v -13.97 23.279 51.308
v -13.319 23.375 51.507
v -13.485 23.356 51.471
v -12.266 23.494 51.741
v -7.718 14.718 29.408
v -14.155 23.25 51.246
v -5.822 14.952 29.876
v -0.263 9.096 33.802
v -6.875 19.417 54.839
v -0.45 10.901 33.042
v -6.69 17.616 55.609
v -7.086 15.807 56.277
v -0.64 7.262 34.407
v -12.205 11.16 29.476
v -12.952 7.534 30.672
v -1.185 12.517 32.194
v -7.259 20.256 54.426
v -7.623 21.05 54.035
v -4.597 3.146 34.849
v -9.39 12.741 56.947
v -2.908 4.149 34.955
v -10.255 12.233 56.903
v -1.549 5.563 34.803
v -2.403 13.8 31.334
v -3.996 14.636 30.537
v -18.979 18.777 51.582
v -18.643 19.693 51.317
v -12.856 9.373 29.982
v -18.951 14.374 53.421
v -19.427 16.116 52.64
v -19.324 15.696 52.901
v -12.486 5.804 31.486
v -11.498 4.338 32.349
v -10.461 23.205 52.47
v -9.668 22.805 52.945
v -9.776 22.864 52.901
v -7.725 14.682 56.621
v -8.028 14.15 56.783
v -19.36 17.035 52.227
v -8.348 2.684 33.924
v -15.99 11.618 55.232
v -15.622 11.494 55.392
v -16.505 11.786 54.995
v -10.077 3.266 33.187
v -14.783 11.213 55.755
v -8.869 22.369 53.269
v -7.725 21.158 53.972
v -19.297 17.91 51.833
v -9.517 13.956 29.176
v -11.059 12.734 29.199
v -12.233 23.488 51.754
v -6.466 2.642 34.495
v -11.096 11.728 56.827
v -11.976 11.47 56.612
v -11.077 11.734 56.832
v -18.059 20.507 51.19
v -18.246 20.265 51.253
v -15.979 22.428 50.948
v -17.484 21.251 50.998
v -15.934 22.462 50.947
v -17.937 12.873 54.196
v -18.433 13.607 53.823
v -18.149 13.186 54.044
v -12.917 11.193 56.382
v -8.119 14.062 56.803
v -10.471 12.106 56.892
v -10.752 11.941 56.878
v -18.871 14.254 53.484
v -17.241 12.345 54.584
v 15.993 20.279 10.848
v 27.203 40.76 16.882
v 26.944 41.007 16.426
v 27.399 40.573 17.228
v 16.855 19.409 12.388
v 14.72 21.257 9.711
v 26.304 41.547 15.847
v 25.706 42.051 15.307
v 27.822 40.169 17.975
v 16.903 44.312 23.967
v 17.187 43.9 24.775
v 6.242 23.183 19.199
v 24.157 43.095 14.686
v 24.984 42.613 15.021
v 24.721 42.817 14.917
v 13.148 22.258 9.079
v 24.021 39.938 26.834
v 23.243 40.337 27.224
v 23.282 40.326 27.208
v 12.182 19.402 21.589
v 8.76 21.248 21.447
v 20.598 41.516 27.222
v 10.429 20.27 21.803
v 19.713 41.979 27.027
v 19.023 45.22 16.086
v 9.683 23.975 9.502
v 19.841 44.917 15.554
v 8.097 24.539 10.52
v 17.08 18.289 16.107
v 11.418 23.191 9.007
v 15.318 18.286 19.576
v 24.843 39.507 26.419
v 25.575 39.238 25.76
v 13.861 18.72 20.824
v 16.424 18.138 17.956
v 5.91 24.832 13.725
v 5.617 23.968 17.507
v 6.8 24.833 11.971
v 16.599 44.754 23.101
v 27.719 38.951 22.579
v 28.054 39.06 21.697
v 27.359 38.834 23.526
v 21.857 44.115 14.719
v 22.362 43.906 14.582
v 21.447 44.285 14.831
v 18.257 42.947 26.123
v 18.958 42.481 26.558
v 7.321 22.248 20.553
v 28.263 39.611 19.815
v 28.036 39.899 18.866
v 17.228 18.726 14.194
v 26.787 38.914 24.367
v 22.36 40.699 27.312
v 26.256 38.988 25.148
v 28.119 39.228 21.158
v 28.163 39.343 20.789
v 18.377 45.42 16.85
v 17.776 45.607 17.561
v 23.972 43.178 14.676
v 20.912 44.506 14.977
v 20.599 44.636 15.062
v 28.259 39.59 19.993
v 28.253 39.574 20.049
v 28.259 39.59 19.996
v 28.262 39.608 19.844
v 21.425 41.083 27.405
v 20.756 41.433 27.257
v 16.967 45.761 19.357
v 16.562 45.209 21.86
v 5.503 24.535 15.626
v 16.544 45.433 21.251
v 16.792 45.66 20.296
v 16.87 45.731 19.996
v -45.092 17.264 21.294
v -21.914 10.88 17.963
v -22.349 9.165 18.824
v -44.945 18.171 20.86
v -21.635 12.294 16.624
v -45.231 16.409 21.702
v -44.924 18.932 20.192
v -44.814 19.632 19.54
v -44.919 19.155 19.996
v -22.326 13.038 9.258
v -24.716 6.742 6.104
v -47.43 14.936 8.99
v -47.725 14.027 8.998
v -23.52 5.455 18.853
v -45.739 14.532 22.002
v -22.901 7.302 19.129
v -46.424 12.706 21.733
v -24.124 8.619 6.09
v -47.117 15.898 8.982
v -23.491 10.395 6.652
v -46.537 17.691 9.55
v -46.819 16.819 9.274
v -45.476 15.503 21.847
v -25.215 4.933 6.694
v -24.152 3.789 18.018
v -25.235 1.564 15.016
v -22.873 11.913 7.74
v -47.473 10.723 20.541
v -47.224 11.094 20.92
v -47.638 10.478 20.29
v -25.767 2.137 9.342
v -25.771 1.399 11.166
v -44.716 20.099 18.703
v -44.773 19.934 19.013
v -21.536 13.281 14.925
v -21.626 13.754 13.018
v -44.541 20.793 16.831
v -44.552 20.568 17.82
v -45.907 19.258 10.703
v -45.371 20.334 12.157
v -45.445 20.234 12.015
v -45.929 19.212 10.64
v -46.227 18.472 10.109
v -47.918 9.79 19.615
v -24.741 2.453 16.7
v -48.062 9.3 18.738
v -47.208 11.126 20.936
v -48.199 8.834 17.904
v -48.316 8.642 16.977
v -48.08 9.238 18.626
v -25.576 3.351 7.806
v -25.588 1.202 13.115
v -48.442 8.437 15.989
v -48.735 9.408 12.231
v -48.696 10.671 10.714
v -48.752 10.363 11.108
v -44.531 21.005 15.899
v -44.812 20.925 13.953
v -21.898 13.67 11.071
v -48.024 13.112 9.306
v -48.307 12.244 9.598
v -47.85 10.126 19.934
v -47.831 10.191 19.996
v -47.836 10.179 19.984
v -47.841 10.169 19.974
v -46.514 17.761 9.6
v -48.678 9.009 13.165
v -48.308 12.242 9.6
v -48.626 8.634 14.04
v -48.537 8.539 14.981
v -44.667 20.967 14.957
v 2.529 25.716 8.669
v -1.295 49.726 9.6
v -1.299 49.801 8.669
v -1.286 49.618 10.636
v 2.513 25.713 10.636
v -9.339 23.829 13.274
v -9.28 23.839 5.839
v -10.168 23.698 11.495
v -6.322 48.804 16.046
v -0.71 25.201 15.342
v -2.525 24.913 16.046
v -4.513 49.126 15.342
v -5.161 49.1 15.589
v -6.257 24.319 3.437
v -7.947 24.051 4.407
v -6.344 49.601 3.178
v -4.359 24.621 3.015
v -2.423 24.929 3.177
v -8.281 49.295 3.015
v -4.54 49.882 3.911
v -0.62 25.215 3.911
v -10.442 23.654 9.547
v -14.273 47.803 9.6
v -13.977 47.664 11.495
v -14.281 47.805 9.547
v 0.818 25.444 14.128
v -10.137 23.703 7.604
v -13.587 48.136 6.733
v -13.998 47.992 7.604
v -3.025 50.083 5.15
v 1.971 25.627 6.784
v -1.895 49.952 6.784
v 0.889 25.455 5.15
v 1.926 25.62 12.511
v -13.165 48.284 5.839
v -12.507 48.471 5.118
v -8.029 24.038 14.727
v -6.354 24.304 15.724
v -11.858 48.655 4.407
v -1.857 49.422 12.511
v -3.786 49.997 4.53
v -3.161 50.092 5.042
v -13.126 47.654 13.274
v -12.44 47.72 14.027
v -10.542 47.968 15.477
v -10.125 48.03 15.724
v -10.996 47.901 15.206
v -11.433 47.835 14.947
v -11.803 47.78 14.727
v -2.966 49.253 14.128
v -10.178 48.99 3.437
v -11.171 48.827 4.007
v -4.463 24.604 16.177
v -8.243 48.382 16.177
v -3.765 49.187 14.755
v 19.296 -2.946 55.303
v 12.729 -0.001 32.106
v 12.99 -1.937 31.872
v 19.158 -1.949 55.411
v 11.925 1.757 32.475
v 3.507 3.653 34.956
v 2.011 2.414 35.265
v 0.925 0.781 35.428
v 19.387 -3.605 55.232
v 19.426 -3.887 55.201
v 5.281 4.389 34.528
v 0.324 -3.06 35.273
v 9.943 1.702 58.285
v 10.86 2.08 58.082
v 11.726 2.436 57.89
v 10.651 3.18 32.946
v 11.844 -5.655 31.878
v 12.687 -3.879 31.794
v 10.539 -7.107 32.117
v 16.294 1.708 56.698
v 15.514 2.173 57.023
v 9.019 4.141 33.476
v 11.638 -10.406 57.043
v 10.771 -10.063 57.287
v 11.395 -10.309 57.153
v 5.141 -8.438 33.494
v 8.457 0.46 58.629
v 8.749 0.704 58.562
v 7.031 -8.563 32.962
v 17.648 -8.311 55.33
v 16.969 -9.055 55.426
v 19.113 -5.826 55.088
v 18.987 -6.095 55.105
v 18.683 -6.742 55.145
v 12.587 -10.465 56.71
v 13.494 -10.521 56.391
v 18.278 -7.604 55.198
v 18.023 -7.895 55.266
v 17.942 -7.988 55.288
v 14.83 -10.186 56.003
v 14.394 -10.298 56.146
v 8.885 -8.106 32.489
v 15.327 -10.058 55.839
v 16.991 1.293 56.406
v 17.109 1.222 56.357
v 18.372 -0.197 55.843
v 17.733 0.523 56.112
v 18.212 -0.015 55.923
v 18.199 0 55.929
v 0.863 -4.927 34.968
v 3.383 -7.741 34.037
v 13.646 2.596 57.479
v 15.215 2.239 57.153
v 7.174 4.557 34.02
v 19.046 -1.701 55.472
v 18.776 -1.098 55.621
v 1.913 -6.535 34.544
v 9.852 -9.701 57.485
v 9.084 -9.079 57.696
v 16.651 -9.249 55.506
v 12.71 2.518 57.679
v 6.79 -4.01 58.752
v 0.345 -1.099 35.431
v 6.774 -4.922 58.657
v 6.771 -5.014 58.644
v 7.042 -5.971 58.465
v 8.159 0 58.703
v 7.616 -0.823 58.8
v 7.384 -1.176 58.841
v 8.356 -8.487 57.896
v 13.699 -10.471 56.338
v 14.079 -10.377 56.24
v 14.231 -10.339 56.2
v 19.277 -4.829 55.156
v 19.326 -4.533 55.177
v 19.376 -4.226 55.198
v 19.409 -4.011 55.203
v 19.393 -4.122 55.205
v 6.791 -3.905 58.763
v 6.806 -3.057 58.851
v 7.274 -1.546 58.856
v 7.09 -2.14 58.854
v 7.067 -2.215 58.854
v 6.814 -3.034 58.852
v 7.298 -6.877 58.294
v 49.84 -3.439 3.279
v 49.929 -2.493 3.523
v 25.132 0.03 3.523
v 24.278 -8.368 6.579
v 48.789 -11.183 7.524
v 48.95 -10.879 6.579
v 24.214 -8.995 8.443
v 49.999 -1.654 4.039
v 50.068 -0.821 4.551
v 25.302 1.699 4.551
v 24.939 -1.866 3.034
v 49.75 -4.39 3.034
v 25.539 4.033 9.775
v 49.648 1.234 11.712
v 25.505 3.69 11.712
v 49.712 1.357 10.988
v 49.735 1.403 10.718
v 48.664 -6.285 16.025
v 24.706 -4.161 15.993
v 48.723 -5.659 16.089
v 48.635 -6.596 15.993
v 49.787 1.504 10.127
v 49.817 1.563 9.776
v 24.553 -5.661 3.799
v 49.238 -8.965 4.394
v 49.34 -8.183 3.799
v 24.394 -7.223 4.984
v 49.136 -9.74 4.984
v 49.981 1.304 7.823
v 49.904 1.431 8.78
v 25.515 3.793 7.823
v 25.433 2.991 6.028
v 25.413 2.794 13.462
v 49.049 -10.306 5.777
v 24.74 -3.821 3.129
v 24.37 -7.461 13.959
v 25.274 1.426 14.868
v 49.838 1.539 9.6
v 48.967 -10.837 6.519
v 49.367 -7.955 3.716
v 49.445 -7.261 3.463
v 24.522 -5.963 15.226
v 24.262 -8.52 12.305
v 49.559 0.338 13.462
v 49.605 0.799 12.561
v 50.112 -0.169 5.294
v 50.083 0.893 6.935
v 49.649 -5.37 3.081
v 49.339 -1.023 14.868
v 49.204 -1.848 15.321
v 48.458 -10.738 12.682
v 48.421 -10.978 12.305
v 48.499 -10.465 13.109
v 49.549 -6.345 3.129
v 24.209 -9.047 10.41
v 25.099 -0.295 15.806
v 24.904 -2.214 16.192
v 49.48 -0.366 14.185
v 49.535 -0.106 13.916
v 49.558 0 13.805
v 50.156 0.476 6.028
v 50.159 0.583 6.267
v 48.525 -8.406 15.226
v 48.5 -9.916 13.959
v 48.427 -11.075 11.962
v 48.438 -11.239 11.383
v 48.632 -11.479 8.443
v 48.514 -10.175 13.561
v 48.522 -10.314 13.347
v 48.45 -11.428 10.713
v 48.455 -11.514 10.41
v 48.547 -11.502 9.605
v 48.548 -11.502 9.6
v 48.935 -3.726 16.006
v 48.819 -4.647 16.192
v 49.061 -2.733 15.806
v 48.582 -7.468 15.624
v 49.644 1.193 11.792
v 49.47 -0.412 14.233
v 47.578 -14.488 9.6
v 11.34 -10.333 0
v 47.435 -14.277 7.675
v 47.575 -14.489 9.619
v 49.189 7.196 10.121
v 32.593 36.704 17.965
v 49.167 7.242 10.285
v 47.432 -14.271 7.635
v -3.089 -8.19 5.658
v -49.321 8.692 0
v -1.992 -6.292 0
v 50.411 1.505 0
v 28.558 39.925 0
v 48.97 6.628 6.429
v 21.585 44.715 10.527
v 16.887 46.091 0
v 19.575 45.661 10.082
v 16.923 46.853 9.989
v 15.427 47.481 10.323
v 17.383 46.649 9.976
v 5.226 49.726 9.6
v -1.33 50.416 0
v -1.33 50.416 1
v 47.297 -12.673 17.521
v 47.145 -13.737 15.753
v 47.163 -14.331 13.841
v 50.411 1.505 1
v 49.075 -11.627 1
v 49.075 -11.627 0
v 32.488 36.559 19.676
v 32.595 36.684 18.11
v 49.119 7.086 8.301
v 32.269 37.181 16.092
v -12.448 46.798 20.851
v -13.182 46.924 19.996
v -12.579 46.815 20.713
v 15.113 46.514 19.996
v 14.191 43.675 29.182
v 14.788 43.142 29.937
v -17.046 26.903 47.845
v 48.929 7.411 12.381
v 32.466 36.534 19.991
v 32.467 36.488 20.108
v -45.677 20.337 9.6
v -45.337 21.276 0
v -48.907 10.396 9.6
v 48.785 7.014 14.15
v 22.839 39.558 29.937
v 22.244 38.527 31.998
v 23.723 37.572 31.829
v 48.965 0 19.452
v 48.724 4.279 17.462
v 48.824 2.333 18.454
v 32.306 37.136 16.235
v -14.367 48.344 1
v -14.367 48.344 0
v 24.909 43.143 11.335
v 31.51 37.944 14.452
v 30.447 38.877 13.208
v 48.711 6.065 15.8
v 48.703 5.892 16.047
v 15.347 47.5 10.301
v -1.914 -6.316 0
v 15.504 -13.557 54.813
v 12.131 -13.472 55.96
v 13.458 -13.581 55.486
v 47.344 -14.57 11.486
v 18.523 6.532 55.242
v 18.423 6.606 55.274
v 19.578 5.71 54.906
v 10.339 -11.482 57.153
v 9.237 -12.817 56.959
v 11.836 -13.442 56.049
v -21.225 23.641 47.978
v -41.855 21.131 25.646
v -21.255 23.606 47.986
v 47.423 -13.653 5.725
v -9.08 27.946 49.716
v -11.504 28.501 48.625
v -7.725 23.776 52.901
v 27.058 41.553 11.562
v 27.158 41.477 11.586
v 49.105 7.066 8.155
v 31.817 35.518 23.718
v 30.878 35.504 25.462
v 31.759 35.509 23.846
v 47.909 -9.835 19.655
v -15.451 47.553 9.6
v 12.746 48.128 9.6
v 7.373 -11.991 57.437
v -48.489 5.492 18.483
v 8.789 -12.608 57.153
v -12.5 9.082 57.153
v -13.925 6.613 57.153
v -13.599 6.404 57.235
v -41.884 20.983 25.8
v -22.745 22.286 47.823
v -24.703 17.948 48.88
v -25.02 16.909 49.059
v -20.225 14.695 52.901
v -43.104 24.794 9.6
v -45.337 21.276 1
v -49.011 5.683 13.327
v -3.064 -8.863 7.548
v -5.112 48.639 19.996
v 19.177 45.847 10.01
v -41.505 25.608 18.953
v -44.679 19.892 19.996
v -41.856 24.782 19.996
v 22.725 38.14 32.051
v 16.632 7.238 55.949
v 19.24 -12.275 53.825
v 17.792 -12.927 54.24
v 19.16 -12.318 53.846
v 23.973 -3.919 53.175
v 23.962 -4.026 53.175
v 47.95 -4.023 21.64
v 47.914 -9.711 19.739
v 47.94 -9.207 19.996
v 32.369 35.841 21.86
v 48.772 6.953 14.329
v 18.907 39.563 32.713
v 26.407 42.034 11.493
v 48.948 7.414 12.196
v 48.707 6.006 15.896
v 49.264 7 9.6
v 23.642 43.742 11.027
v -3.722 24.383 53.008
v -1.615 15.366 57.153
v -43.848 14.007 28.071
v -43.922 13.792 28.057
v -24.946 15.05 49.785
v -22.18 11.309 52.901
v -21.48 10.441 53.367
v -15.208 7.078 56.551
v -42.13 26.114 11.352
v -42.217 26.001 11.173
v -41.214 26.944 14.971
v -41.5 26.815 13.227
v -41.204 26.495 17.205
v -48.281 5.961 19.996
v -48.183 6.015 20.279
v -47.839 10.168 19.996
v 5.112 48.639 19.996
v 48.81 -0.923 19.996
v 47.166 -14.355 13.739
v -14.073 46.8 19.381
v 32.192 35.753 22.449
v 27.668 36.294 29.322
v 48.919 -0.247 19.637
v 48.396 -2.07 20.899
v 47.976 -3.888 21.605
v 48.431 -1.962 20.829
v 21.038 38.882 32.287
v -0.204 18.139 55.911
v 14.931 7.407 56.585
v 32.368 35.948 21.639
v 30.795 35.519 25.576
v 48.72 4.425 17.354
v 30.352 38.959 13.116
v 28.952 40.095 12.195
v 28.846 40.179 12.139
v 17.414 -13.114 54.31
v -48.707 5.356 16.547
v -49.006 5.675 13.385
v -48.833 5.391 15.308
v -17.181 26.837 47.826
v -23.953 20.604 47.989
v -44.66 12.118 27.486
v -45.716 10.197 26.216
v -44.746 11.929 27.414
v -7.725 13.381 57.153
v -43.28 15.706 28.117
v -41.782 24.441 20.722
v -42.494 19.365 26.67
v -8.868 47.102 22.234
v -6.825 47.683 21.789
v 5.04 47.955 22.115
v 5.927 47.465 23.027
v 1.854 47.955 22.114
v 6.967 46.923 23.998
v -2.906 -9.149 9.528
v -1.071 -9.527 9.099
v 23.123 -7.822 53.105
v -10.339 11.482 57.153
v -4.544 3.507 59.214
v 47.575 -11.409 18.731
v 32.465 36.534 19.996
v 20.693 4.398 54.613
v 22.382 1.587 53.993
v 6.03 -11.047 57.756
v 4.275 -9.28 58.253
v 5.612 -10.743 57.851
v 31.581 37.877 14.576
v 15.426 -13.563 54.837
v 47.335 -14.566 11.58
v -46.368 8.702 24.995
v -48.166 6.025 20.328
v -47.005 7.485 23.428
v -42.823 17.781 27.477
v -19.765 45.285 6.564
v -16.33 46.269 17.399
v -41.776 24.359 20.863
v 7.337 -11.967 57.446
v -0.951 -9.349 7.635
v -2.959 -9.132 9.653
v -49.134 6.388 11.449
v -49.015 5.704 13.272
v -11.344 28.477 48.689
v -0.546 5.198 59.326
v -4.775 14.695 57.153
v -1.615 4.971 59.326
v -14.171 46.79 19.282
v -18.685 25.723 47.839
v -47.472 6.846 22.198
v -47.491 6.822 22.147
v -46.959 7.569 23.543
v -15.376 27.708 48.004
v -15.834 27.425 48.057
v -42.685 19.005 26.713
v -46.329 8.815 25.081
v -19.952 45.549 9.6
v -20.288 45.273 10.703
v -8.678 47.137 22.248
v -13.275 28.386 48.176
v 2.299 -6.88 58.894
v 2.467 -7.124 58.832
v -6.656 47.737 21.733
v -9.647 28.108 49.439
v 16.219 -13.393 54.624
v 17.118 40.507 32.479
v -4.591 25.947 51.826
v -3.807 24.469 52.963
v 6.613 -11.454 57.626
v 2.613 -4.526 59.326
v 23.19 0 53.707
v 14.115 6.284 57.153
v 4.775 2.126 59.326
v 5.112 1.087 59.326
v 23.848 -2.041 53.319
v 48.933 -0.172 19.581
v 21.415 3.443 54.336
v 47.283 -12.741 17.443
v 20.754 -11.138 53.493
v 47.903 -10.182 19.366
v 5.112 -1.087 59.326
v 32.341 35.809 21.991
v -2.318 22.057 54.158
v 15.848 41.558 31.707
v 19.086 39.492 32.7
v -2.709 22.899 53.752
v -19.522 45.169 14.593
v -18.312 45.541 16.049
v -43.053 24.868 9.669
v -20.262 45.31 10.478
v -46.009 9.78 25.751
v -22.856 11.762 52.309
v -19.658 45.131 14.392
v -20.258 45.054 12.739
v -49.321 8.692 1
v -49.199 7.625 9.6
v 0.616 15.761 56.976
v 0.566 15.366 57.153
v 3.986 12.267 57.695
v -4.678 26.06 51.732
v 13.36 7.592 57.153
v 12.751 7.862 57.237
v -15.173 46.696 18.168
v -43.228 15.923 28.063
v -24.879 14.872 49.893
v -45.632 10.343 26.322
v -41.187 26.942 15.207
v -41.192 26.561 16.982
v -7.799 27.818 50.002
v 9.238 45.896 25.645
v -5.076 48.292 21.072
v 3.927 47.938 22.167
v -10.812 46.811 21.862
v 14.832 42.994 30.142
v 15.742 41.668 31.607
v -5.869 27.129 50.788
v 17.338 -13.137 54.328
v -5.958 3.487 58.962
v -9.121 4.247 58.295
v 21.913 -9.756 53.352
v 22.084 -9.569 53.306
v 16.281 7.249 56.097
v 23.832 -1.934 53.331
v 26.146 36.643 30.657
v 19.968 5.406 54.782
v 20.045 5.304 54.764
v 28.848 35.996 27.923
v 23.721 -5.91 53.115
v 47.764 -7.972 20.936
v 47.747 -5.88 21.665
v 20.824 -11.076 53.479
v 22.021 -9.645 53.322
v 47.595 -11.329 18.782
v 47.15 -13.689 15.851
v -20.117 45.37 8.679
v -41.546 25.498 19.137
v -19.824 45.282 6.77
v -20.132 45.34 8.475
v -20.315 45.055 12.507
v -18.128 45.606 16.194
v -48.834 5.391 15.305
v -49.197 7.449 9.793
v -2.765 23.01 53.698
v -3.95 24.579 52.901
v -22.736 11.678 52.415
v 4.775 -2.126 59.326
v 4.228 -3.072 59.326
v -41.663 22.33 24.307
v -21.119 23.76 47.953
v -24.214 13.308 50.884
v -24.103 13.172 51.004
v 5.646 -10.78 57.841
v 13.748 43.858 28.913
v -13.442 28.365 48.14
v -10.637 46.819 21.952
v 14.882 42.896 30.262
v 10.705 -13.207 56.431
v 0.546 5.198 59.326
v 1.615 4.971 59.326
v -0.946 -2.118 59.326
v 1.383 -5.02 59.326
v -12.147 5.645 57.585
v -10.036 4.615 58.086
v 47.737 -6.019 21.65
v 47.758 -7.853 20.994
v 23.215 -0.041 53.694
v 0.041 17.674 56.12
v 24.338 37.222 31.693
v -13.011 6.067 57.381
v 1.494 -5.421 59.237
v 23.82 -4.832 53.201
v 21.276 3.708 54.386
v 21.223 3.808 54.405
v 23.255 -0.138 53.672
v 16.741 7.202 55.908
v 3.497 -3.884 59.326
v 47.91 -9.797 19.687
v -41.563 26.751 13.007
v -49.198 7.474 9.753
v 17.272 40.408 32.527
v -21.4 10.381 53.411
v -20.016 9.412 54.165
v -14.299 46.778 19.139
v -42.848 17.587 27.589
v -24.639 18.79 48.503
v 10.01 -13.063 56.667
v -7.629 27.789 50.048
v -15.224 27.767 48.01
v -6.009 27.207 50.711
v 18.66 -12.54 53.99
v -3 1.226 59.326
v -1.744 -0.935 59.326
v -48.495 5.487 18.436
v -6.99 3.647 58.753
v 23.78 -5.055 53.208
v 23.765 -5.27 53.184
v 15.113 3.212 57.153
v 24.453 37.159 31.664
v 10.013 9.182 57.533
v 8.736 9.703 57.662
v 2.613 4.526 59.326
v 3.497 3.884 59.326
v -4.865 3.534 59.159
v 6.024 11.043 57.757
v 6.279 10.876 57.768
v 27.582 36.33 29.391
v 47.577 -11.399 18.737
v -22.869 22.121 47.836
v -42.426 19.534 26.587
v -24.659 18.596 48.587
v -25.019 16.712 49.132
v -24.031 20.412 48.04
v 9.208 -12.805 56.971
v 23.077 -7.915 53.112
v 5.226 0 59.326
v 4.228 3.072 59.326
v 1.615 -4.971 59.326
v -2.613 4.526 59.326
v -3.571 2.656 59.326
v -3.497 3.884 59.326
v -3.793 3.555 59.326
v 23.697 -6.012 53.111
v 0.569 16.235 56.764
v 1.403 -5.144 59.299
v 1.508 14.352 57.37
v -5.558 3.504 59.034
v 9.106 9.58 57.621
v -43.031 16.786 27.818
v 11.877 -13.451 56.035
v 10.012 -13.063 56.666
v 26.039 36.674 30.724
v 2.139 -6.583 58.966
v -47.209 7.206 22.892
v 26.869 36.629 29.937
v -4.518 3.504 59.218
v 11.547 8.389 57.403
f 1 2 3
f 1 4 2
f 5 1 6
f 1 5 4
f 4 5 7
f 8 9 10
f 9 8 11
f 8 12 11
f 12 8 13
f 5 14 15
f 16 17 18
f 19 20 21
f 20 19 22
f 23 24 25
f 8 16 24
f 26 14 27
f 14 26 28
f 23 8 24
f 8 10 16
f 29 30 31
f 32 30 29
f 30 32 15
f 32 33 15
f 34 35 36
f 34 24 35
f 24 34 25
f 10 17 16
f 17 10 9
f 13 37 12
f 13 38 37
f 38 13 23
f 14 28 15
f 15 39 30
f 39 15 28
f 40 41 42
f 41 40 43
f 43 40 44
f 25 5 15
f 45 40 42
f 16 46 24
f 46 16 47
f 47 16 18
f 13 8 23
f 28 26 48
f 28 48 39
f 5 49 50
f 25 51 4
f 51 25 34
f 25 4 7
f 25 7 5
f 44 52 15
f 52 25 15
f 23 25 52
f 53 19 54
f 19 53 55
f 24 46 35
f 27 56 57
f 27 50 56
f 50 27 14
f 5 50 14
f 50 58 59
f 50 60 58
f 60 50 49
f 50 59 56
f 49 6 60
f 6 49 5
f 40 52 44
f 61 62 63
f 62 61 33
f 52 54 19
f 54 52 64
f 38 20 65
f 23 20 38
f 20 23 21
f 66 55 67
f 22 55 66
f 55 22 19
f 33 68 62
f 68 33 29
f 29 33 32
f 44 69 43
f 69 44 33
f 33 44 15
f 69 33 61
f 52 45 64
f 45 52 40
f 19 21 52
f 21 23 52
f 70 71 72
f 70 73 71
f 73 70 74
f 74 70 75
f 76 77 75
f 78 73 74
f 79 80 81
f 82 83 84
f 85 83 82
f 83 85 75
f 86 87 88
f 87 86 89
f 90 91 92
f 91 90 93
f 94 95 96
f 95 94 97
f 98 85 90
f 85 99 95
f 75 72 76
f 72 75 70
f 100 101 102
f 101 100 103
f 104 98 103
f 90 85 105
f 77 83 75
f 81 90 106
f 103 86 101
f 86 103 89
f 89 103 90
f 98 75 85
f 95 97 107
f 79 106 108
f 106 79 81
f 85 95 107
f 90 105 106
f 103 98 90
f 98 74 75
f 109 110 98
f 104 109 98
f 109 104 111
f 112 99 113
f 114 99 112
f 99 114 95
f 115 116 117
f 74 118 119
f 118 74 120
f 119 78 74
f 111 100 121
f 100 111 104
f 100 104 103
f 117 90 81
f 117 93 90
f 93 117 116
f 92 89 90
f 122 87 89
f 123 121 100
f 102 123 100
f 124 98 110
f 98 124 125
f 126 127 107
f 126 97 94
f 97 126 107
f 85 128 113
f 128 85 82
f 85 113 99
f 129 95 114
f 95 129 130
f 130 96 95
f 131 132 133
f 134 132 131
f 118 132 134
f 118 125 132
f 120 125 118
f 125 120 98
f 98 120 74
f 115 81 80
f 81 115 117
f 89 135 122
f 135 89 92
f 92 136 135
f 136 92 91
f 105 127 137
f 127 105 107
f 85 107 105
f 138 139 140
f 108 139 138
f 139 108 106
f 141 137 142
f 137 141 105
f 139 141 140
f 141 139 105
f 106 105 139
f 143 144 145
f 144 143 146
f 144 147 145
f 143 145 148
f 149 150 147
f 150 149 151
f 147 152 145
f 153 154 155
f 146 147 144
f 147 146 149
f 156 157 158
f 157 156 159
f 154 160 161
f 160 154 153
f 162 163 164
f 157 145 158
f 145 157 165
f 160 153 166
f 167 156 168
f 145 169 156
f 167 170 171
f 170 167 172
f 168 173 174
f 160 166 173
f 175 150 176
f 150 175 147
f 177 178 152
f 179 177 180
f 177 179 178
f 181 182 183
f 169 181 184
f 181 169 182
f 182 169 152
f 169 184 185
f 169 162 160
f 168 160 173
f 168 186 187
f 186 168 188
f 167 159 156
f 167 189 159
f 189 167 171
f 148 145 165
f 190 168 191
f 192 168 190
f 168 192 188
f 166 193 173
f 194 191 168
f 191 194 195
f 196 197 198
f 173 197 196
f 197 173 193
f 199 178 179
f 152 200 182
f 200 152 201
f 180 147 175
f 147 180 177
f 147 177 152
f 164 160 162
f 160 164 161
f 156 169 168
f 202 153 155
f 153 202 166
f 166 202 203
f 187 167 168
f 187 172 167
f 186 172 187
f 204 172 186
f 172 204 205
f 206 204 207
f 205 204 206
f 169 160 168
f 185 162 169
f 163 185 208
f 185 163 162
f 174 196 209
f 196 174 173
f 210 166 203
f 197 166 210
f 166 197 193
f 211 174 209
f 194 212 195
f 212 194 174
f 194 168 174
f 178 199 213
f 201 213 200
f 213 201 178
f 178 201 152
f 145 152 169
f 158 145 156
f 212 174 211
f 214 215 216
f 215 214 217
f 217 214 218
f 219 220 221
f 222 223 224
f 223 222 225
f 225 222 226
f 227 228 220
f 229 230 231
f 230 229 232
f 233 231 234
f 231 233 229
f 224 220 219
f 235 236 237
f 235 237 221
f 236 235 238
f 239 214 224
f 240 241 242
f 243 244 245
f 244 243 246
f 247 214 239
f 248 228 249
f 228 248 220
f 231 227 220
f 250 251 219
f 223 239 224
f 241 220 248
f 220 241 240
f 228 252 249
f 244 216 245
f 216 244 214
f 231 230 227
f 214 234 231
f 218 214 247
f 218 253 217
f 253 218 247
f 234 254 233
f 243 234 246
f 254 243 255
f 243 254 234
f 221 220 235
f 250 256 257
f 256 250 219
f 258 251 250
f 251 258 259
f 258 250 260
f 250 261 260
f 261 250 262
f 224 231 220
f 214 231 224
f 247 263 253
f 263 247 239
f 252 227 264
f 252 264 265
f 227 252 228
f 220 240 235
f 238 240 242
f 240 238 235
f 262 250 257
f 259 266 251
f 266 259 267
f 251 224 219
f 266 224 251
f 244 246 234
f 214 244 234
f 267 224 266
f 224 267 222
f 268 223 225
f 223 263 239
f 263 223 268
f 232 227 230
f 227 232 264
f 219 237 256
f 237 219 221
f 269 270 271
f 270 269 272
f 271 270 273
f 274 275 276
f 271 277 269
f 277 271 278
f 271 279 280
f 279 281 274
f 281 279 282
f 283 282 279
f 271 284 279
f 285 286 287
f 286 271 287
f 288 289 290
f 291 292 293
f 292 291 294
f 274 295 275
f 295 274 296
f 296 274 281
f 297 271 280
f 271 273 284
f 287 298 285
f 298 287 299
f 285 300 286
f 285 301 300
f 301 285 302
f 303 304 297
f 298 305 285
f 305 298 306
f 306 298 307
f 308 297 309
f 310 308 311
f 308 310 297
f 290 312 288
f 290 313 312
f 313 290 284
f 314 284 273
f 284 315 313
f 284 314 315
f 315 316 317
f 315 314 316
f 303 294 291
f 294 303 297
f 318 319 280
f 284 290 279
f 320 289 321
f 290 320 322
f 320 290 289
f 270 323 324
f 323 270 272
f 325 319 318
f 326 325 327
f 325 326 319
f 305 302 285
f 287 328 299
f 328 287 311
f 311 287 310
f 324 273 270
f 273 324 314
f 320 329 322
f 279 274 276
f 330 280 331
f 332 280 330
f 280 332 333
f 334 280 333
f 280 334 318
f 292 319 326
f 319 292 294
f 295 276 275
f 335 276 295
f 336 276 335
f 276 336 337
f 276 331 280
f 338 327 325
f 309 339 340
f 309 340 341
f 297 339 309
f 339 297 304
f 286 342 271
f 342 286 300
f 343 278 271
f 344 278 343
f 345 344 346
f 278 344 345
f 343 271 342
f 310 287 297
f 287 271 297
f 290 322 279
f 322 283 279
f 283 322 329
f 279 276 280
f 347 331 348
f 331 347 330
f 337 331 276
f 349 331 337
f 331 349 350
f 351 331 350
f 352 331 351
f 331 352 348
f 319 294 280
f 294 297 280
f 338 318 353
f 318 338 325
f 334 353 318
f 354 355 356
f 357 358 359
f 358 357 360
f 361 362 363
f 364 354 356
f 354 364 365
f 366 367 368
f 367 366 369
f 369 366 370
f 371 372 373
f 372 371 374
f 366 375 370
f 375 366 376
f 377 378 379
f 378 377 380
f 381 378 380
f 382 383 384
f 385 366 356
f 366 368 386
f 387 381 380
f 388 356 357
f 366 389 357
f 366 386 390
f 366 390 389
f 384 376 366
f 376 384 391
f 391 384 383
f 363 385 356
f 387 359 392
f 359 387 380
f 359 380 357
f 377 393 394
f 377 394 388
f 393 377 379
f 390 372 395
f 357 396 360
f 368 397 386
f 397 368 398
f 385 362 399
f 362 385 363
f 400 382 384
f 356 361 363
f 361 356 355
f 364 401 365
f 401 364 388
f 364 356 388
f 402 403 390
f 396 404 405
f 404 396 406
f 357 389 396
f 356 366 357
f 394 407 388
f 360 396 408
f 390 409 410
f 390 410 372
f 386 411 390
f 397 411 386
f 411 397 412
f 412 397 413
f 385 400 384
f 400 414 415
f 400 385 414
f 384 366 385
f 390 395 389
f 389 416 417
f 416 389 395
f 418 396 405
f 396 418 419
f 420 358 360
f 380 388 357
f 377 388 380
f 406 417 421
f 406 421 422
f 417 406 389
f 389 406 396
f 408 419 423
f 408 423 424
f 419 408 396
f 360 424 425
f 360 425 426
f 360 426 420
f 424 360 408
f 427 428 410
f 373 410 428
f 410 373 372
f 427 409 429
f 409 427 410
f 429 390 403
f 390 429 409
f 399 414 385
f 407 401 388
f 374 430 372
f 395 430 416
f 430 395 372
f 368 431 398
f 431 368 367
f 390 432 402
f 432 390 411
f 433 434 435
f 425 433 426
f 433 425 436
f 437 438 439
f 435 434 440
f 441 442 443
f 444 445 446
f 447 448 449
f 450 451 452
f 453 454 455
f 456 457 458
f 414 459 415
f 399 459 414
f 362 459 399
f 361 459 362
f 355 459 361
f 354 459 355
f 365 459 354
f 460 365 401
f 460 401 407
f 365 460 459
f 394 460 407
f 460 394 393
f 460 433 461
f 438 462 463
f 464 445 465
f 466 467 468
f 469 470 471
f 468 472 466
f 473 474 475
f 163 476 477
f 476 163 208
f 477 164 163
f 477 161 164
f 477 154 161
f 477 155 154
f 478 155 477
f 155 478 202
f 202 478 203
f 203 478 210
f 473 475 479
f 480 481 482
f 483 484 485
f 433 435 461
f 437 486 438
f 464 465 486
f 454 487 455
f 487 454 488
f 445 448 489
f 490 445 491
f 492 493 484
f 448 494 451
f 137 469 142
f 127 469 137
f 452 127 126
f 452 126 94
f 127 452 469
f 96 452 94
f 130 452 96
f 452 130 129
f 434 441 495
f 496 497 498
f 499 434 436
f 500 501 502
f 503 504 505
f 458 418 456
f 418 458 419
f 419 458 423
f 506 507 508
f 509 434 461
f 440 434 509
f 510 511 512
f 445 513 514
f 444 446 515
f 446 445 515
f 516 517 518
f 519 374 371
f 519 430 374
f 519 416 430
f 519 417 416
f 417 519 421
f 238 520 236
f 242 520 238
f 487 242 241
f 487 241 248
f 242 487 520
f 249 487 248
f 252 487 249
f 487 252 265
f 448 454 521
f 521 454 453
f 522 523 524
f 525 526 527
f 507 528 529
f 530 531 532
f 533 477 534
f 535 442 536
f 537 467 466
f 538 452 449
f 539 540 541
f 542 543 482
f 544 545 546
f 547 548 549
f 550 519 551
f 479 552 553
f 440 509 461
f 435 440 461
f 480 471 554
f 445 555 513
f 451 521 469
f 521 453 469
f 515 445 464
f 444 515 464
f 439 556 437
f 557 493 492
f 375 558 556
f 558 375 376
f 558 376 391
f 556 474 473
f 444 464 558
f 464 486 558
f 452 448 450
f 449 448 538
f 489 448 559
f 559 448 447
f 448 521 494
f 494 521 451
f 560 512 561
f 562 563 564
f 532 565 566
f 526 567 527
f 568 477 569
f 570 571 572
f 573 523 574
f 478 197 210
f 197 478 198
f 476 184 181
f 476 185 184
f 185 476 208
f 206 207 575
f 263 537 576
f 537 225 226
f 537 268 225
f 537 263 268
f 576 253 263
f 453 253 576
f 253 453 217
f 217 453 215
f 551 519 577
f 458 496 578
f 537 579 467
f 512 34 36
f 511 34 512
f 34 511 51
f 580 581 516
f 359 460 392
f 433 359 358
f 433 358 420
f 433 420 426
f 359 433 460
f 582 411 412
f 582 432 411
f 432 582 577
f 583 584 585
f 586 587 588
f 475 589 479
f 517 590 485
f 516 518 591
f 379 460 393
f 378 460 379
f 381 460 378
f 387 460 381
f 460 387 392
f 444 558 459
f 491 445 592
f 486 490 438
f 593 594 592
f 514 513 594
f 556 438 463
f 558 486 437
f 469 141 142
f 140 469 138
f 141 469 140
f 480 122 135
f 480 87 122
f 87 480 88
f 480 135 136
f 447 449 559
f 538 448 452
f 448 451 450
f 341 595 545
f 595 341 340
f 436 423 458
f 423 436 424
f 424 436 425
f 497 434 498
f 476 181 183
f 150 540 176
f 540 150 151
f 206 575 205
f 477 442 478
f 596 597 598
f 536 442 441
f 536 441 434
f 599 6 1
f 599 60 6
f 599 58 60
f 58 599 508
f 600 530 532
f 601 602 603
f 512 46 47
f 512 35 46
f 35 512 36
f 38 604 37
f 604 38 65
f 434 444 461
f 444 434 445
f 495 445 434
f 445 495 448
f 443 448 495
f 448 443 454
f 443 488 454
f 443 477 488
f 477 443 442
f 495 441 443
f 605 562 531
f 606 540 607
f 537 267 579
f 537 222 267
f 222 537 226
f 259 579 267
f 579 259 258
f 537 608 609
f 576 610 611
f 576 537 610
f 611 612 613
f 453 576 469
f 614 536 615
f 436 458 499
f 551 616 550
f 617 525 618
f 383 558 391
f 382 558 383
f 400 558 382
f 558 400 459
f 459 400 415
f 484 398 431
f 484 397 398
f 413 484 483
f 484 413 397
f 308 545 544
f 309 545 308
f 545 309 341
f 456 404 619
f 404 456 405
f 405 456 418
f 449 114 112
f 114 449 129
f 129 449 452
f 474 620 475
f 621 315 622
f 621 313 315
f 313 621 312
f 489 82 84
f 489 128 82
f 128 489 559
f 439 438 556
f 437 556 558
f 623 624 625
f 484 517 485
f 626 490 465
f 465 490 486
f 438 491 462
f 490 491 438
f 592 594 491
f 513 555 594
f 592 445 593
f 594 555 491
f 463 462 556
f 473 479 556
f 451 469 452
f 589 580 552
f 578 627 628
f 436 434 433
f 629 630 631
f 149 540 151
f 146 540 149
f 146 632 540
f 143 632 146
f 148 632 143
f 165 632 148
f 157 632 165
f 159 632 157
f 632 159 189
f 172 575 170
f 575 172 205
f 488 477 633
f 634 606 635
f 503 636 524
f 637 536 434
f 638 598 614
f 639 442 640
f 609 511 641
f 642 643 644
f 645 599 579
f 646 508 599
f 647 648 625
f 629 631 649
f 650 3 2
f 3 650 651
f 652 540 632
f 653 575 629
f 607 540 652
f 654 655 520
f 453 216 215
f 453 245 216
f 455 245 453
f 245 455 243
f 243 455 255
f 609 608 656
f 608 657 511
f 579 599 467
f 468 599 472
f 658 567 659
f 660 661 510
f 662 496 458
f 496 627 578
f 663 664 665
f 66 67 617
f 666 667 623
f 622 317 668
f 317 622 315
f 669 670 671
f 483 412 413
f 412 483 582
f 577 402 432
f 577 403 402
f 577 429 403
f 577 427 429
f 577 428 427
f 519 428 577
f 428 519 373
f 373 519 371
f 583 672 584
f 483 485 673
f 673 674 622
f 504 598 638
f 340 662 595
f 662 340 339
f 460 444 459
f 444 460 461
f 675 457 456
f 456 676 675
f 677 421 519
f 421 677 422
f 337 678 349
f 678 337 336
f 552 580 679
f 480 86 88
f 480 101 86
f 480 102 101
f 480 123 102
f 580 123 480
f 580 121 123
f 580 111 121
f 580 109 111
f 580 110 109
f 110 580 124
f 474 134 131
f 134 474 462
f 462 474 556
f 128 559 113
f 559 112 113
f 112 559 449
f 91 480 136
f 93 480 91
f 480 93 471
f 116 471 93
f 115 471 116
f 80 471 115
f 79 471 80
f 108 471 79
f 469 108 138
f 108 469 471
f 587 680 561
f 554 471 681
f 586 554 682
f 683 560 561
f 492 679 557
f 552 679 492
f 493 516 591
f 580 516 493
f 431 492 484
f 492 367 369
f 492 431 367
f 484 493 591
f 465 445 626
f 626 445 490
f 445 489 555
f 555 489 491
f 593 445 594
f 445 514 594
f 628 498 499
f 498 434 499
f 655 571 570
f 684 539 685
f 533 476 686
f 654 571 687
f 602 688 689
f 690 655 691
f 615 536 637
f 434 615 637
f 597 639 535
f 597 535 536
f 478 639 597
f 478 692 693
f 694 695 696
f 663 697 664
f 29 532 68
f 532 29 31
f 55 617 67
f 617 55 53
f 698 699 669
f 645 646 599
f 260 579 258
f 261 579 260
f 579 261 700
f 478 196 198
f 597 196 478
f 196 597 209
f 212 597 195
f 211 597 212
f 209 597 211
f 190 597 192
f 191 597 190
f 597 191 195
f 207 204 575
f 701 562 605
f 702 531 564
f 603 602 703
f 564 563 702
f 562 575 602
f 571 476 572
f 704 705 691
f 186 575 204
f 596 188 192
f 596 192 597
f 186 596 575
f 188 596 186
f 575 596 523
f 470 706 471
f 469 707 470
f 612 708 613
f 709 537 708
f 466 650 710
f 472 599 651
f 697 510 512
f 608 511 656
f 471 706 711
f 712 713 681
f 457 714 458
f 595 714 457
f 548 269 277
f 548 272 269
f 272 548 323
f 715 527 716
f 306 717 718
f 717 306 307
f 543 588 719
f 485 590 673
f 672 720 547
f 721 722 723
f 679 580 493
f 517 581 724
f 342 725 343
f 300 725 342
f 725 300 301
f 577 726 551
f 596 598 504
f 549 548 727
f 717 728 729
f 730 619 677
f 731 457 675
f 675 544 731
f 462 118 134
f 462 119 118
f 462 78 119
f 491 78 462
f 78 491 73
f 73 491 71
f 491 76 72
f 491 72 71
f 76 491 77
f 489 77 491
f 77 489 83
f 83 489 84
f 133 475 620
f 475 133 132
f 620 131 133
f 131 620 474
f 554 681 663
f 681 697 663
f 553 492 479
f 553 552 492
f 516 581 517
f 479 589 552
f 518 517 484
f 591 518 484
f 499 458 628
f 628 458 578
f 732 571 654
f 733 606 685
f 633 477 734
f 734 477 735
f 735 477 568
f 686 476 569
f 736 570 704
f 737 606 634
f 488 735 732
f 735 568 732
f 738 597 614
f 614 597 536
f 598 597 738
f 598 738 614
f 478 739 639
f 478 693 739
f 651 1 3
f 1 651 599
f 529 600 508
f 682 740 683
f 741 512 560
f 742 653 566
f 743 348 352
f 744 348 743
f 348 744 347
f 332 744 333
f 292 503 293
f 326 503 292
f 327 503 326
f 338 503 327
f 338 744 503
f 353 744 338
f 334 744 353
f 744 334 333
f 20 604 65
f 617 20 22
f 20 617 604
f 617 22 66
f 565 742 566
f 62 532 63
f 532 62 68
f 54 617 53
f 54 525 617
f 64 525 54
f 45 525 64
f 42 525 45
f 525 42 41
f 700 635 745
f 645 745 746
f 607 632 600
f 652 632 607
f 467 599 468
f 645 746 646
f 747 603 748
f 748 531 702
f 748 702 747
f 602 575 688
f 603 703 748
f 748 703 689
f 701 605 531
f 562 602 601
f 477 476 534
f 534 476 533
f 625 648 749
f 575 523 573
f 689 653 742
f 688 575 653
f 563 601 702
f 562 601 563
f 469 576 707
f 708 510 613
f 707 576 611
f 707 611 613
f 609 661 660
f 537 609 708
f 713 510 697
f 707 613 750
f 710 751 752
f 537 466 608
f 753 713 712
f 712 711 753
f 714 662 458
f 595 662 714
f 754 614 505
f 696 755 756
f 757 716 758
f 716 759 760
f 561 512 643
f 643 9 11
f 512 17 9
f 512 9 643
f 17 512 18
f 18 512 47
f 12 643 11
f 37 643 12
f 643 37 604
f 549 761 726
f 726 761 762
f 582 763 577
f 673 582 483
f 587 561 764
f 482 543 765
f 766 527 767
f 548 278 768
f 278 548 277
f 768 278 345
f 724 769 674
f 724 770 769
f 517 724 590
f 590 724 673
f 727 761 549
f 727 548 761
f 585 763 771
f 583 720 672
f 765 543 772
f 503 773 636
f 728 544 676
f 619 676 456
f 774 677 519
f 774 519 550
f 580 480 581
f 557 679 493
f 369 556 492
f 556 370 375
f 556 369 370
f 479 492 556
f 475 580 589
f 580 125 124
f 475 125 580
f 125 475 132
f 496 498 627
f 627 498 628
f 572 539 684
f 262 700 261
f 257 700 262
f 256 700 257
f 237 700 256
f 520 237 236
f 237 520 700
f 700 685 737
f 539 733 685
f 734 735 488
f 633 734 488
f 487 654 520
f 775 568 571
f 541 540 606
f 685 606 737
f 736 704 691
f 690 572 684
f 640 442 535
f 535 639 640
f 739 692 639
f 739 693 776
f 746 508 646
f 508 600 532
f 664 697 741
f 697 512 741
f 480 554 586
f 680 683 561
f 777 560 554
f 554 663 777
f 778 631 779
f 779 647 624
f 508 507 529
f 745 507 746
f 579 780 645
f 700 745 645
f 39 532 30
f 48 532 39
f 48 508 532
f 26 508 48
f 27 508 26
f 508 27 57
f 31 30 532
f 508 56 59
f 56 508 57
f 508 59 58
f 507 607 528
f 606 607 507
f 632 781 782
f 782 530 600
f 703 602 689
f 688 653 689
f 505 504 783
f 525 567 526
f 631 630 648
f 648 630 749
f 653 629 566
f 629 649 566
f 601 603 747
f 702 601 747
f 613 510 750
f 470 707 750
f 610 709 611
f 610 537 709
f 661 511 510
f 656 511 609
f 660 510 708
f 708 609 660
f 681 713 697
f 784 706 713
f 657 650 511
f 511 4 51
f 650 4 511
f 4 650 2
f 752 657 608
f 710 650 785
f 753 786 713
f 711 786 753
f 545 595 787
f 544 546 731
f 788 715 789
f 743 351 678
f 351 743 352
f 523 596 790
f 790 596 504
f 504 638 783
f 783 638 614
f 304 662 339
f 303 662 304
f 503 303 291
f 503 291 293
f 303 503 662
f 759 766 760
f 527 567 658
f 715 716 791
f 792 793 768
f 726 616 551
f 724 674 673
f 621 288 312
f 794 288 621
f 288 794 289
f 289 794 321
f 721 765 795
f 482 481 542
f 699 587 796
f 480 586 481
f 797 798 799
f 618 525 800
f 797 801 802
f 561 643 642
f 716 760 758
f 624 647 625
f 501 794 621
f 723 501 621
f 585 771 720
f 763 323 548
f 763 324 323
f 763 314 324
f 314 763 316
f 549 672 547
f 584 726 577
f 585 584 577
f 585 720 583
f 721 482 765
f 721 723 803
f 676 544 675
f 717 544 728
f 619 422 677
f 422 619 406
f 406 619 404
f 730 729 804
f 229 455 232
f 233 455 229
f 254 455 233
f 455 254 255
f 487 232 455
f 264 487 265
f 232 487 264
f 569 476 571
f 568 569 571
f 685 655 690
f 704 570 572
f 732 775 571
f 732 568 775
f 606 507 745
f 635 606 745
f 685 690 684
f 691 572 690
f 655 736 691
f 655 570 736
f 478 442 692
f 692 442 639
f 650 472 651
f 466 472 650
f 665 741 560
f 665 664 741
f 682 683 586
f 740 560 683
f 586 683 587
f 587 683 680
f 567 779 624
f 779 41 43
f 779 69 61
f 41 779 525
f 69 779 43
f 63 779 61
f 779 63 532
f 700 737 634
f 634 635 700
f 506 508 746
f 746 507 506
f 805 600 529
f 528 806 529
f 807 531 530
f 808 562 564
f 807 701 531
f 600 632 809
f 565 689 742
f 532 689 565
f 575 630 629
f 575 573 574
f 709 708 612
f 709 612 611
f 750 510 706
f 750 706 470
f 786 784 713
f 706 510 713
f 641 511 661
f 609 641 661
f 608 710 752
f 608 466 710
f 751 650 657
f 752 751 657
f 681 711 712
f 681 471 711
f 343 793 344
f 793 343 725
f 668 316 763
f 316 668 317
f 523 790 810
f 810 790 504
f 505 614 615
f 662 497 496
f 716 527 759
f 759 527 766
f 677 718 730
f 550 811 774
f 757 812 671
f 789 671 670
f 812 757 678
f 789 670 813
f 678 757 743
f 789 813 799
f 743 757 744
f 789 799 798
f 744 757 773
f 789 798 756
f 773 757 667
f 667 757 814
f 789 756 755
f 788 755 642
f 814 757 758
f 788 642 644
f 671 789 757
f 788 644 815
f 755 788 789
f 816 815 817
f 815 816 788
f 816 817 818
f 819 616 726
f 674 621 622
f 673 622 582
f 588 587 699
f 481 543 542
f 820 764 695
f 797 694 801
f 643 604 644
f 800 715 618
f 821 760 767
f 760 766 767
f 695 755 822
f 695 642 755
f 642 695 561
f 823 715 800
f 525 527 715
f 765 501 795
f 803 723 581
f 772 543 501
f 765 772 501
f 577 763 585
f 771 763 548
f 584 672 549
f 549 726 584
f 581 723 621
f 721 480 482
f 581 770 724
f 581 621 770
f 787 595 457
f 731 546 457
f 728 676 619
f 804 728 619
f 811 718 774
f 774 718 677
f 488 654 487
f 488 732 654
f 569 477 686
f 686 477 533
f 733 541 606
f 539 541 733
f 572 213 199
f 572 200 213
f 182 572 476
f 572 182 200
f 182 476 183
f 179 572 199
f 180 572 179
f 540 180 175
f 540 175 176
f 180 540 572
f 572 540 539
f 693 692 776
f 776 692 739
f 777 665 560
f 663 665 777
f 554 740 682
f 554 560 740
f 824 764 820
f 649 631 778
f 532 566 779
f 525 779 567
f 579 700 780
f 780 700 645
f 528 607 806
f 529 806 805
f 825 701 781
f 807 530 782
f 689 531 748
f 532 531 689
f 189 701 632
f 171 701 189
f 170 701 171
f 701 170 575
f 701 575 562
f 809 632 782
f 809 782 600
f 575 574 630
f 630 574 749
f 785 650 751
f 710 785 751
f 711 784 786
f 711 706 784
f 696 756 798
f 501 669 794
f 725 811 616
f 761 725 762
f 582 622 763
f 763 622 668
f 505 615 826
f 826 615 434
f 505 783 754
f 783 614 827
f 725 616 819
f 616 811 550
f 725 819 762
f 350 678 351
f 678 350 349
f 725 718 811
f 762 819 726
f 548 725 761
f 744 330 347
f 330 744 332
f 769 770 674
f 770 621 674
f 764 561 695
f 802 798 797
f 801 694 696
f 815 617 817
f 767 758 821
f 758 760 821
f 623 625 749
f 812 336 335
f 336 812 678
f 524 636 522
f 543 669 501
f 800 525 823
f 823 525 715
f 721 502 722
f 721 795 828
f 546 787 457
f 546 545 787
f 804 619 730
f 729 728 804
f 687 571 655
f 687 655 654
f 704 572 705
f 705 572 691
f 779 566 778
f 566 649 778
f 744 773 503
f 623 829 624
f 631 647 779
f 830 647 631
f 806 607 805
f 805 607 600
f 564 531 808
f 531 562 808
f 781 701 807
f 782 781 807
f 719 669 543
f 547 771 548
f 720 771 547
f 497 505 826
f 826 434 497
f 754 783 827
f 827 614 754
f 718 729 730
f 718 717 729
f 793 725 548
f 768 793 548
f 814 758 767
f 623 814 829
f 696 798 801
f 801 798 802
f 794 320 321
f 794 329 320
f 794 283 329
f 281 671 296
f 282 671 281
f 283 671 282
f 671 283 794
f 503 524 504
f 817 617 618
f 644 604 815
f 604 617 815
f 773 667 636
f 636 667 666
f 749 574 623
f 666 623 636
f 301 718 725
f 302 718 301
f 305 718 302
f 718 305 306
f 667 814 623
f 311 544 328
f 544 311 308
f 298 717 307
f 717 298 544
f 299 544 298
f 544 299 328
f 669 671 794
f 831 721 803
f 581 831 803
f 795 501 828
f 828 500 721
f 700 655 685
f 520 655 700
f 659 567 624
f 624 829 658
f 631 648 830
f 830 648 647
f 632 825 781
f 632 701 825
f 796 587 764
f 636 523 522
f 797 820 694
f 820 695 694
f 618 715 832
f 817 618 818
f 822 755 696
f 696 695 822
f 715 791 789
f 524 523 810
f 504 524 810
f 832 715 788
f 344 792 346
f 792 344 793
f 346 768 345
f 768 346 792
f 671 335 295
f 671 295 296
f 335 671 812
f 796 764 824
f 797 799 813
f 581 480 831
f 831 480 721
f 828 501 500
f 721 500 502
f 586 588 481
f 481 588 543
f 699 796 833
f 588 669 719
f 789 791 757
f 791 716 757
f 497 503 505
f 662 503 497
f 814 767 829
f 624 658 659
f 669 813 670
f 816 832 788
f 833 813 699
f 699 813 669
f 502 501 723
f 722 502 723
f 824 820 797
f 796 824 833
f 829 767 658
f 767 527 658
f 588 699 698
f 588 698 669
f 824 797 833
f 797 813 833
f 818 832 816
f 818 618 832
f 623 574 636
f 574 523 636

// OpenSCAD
difference() {
	hull() {
		union() {
			union() {
				rotate(a = 127.0329065610, v = [0, 0, 1]) {
					translate(v = [0, -6.6000000000, 0]) {
						cube(size = [21.9793042902, 13.2000000000, 1]);
					}
				}
				rotate(a = 62.1508837395, v = [0, 0, 1]) {
					translate(v = [0, -6.6000000000, 0]) {
						cube(size = [48.6418554765, 13.2000000000, 1]);
					}
				}
				rotate(a = 162.4323501500, v = [0, 0, 1]) {
					translate(v = [0, -6.6000000000, 0]) {
						cube(size = [49.6443357682, 13.2000000000, 1]);
					}
				}
				rotate(a = 99.0309372098, v = [0, 0, 1]) {
					translate(v = [0, -6.6000000000, 0]) {
						cube(size = [50.0000000000, 13.2000000000, 1]);
					}
				}
				rotate(a = -16.8589737734, v = [0, 0, 1]) {
					translate(v = [0, -6.6000000000, 0]) {
						cube(size = [13.8492364027, 13.2000000000, 1]);
					}
				}
				rotate(a = -5.8091993133, v = [0, 0, 1]) {
					translate(v = [0, -6.6000000000, 0]) {
						cube(size = [50.0000000000, 13.2000000000, 1]);
					}
				}
			}
			translate(v = [0, 0, 9.6000000000]) {
				intersection() {
					hull() {
						rotate(a = 26.0774635381, v = [-0.3509161636, -0.2647519937, 0.0000006157]) {
							cylinder(h = 50, r = 9.6000000000);
						}
						rotate(a = 76.6150693955, v = [-0.8601637058, 0.4544555338, 0.0000004057]) {
							cylinder(h = 50, r = 9.6000000000);
						}
						rotate(a = 83.1620152536, v = [-0.2996845217, -0.9465798281, 0.0000012463]) {
							cylinder(h = 50, r = 9.6000000000);
						}
						rotate(a = 89.9999476489, v = [-0.9876037289, -0.1569677506, 0.0000011446]) {
							cylinder(h = 50, r = 9.6000000000);
						}
						rotate(a = 16.0802877638, v = [0.0803312407, 0.2650793774, -0.0000003454]) {
							cylinder(h = 50, r = 9.6000000000);
						}
						rotate(a = 89.9999436775, v = [0.1012160322, 0.9948644706, -0.0000010961]) {
							cylinder(h = 50, r = 9.6000000000);
						}
					}
					sphere(r = 50);
				}
			}
		}
	}
	translate(v = [0, 0, 9.6000000000]) {
		rotate(a = 26.0774635381, v = [-0.3509161636, -0.2647519937, 0.0000006157]) {
			translate(v = [0, 0, 25]) {
				cylinder(h = 50, r = 6.6000000000);
			}
		}
		rotate(a = 76.6150693955, v = [-0.8601637058, 0.4544555338, 0.0000004057]) {
			translate(v = [0, 0, 25]) {
				cylinder(h = 50, r = 6.6000000000);
			}
		}
		rotate(a = 83.1620152536, v = [-0.2996845217, -0.9465798281, 0.0000012463]) {
			translate(v = [0, 0, 25]) {
				cylinder(h = 50, r = 6.6000000000);
			}
		}
		rotate(a = 89.9999476489, v = [-0.9876037289, -0.1569677506, 0.0000011446]) {
			translate(v = [0, 0, 25]) {
				cylinder(h = 50, r = 6.6000000000);
			}
		}
		rotate(a = 16.0802877638, v = [0.0803312407, 0.2650793774, -0.0000003454]) {
			translate(v = [0, 0, 25]) {
				cylinder(h = 50, r = 6.6000000000);
			}
		}
		rotate(a = 89.9999436775, v = [0.1012160322, 0.9948644706, -0.0000010961]) {
			translate(v = [0, 0, 25]) {
				cylinder(h = 50, r = 6.6000000000);
			}
		}
	}
}
